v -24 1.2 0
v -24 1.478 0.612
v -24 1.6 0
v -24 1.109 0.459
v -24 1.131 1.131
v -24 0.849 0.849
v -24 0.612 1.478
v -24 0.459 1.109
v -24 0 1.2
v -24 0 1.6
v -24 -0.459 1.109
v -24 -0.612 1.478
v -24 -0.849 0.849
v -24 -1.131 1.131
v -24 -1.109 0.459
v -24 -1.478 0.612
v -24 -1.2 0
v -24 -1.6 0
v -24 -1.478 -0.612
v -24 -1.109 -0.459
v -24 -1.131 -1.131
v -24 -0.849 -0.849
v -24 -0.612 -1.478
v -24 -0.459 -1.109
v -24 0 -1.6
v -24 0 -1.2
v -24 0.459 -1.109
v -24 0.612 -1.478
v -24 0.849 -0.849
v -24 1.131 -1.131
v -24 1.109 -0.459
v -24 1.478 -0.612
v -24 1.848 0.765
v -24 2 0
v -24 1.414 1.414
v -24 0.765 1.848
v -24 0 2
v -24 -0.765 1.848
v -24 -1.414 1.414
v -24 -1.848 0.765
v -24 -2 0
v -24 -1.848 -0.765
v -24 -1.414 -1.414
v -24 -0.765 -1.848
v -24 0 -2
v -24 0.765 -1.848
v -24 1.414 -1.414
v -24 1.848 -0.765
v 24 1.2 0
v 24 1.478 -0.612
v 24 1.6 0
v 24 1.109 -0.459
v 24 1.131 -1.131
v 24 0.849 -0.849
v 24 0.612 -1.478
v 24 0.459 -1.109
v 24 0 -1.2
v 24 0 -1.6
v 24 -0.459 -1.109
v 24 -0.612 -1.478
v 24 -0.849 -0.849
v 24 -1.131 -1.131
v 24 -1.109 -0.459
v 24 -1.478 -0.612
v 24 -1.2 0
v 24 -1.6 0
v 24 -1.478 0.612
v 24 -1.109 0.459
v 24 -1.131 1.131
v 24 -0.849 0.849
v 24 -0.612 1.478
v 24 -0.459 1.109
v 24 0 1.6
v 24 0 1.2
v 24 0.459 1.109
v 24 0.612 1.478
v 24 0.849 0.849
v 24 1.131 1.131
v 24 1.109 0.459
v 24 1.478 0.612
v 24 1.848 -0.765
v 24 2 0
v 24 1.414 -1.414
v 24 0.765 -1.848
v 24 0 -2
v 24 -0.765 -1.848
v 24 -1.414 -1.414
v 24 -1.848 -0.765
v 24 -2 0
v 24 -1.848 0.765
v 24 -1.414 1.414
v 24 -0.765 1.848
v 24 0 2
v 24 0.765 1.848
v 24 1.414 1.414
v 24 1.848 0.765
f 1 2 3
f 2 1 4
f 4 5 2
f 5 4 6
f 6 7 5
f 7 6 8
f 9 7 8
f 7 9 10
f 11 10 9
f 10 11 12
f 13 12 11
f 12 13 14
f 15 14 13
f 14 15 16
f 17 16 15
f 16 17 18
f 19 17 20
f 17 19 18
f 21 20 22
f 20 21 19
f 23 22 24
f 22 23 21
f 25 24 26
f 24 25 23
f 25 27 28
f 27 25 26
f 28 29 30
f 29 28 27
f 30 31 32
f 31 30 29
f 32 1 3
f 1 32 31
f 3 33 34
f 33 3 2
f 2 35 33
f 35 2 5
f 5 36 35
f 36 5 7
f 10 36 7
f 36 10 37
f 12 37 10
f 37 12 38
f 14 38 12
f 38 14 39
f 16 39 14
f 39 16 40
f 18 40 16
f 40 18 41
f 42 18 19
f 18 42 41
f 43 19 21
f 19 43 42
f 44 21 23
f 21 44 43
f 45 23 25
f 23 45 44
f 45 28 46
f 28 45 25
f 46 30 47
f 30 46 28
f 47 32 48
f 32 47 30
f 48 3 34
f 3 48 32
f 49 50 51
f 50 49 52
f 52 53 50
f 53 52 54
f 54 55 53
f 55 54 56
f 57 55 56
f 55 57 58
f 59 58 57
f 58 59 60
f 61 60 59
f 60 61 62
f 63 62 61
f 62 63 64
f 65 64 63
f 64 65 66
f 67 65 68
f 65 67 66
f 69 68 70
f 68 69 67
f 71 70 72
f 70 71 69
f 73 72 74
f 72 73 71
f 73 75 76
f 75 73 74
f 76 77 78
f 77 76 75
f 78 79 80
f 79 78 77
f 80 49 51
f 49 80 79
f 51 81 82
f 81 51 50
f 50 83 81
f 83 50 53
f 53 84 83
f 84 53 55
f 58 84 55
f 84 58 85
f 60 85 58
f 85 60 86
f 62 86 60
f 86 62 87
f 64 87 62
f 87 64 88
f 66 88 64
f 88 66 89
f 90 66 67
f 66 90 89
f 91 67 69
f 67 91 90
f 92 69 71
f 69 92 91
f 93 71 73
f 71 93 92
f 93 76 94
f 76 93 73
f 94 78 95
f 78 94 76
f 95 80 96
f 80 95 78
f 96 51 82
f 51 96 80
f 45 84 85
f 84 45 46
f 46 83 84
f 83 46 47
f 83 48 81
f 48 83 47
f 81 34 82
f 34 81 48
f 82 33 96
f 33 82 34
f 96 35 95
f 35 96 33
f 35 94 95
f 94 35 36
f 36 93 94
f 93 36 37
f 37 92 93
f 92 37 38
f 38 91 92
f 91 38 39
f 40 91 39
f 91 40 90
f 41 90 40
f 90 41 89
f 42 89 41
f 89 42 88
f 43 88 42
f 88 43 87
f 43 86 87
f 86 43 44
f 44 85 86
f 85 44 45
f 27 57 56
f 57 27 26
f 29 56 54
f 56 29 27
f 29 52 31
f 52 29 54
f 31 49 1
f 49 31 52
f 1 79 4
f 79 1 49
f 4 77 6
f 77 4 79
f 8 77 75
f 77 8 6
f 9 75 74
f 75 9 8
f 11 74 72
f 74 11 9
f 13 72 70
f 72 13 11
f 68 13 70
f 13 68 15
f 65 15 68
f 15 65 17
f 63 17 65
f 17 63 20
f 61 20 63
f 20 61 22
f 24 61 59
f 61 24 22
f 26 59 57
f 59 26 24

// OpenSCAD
// file: ../p/4-4disc.scad
use <../lib.scad>
$fa=1; $fs=0.2;
function ldraw_lib__4_4disc(realsolid=false) = [
// 0 Disc 1.0
// 0 Name: 4-4disc.dat
// 0 Author: James Jessiman
// 0 !LDRAW_ORG Primitive UPDATE 2002-02
// 0 !LICENSE Licensed under CC BY 2.0 and CC BY 4.0 : see CAreadme.txt
// 
// 0 BFC CERTIFY CCW
  [0,"BFC","CERTIFY"],
  [0,"BFC","CCW"],
// 
// 0 !HISTORY 1998-12-15 [PTadmin] Official Update 1998-10
// 0 !HISTORY 2002-03-23 [sbliss] Added BFC statement
// 0 !HISTORY 2002-04-25 [PTadmin] Official Update 2002-02
// 0 !HISTORY 2007-06-24 [PTadmin] Header formatted for Contributor Agreement
// 0 !HISTORY 2008-07-01 [PTadmin] Official Update 2008-01
// 
// 
// 3 16 0 0 0 1 0 0 0.9239 0 0.3827
  [3,16,0,0,0,1,0,0,0.9239,0,0.3827],
// 3 16 0 0 0 0.9239 0 0.3827 0.7071 0 0.7071
  [3,16,0,0,0,0.9239,0,0.3827,0.7071,0,0.7071],
// 3 16 0 0 0 0.7071 0 0.7071 0.3827 0 0.9239
  [3,16,0,0,0,0.7071,0,0.7071,0.3827,0,0.9239],
// 3 16 0 0 0 0.3827 0 0.9239 0 0 1
  [3,16,0,0,0,0.3827,0,0.9239,0,0,1],
// 3 16 0 0 0 0 0 1 -0.3827 0 0.9239
  [3,16,0,0,0,0,0,1,-0.3827,0,0.9239],
// 3 16 0 0 0 -0.3827 0 0.9239 -0.7071 0 0.7071
  [3,16,0,0,0,-0.3827,0,0.9239,-0.7071,0,0.7071],
// 3 16 0 0 0 -0.7071 0 0.7071 -0.9239 0 0.3827
  [3,16,0,0,0,-0.7071,0,0.7071,-0.9239,0,0.3827],
// 3 16 0 0 0 -0.9239 0 0.3827 -1 0 -0
  [3,16,0,0,0,-0.9239,0,0.3827,-1,0,-0],
// 3 16 0 0 0 -1 0 -0 -0.9239 0 -0.3827
  [3,16,0,0,0,-1,0,-0,-0.9239,0,-0.3827],
// 3 16 0 0 0 -0.9239 0 -0.3827 -0.7071 0 -0.7071
  [3,16,0,0,0,-0.9239,0,-0.3827,-0.7071,0,-0.7071],
// 3 16 0 0 0 -0.7071 0 -0.7071 -0.3827 0 -0.9239
  [3,16,0,0,0,-0.7071,0,-0.7071,-0.3827,0,-0.9239],
// 3 16 0 0 0 -0.3827 0 -0.9239 0 0 -1
  [3,16,0,0,0,-0.3827,0,-0.9239,0,0,-1],
// 3 16 0 0 0 0 0 -1 0.3827 0 -0.9239
  [3,16,0,0,0,0,0,-1,0.3827,0,-0.9239],
// 3 16 0 0 0 0.3827 0 -0.9239 0.7071 0 -0.7071
  [3,16,0,0,0,0.3827,0,-0.9239,0.7071,0,-0.7071],
// 3 16 0 0 0 0.7071 0 -0.7071 0.9239 0 -0.3827
  [3,16,0,0,0,0.7071,0,-0.7071,0.9239,0,-0.3827],
// 3 16 0 0 0 0.9239 0 -0.3827 1 0 0
  [3,16,0,0,0,0.9239,0,-0.3827,1,0,0],
// 0
];
module ldraw_lib__4_4disc(step=0, col=false, unit=2/5, alt=false, line=0.2, solid=!$preview)
    makepoly(ldraw_lib__4_4disc(solid), step=step, col=col, unit=unit, alt=alt, line=line, solid=solid);
ldraw_lib__4_4disc(line=0.2);
// file: ../p/stud3.scad
use <../lib.scad>
use <4-4cyli.scad>
use <4-4disc.scad>
use <4-4edge.scad>
$fa=1; $fs=0.2;
function ldraw_lib__stud3(realsolid=false) = realsolid ? 
    [openscad(translate([0,0,-eps()], o=cylinder(4+eps(), r=4)),2)] : [
// 0 Stud Tube Solid
// 0 Name: stud3.dat
// 0 Author: James Jessiman
// 0 !LDRAW_ORG Primitive UPDATE 2012-01
// 0 !LICENSE Licensed under CC BY 2.0 and CC BY 4.0 : see CAreadme.txt
// 
// 0 BFC CERTIFY CCW
  [0,"BFC","CERTIFY"],
  [0,"BFC","CCW"],
// 
// 0 !HISTORY 2002-04-04 [sbliss] Modified for BFC compliance
// 0 !HISTORY 2002-04-25 [PTadmin] Official Update 2002-02
// 0 !HISTORY 2007-06-24 [PTadmin] Header formatted for Contributor Agreement
// 0 !HISTORY 2008-07-01 [PTadmin] Official Update 2008-01
// 0 !HISTORY 2012-02-16 [Philo] Changed to CCW
// 0 !HISTORY 2012-03-30 [PTadmin] Official Update 2012-01
// 
// 
// 1 16 0 -4 0 4 0 0 0 1 0 0 0 4 4-4edge.dat
  [1,16,0,-4,0,4,0,0,0,1,0,0,0,4, ldraw_lib__4_4edge(realsolid)],
// 1 16 0 0 0 4 0 0 0 1 0 0 0 4 4-4edge.dat
  [1,16,0,0,0,4,0,0,0,1,0,0,0,4, ldraw_lib__4_4edge(realsolid)],
// 1 16 0 -4 0 4 0 0 0 1 0 0 0 4 4-4disc.dat
  [1,16,0,-4,0,4,0,0,0,1,0,0,0,4, ldraw_lib__4_4disc(realsolid)],
// 1 16 0 -4 0 4 0 0 0 4 0 0 0 4 4-4cyli.dat
  [1,16,0,-4,0,4,0,0,0,4,0,0,0,4, ldraw_lib__4_4cyli(realsolid)],
];
module ldraw_lib__stud3(step=0, col=false, unit=2/5, alt=false, line=0.2, solid=!$preview)
    makepoly(ldraw_lib__stud3(solid), step=step, col=col, unit=unit, alt=alt, line=line, solid=solid);
ldraw_lib__stud3(line=0.2);
// file: ../p/stud.scad
use <../lib.scad>
use <4-4cyli.scad>
use <4-4disc.scad>
use <4-4edge.scad>
$fa=1; $fs=0.2;
function ldraw_lib__stud(realsolid=false) = realsolid ? 
    [openscad(translate([0,0,-eps()], o=cylinder(4+eps(), r=6)),2)] : [
// 0 Stud
// 0 Name: stud.dat
// 0 Author: James Jessiman
// 0 !LDRAW_ORG Primitive UPDATE 2012-01
// 0 !LICENSE Licensed under CC BY 2.0 and CC BY 4.0 : see CAreadme.txt
// 
// 0 BFC CERTIFY CCW
  [0,"BFC","CERTIFY"],
  [0,"BFC","CCW"],
// 
// 0 !HISTORY 2002-04-04 [sbliss] Modified for BFC compliance
// 0 !HISTORY 2002-04-25 [PTadmin] Official Update 2002-02
// 0 !HISTORY 2007-06-24 [PTadmin] Header formatted for Contributor Agreement
// 0 !HISTORY 2008-07-01 [PTadmin] Official Update 2008-01
// 0 !HISTORY 2012-02-16 [Philo] Changed to CCW
// 0 !HISTORY 2012-03-30 [PTadmin] Official Update 2012-01
// 
// 
// 1 16 0 0 0 6 0 0 0 1 0 0 0 6 4-4edge.dat
  [1,16,0,0,0,6,0,0,0,1,0,0,0,6, ldraw_lib__4_4edge(realsolid)],
// 1 16 0 -4 0 6 0 0 0 1 0 0 0 6 4-4edge.dat
  [1,16,0,-4,0,6,0,0,0,1,0,0,0,6, ldraw_lib__4_4edge(realsolid)],
// 1 16 0 0 0 6 0 0 0 -4 0 0 0 6 4-4cyli.dat
  [1,16,0,0,0,6,0,0,0,-4,0,0,0,6, ldraw_lib__4_4cyli(realsolid)],
// 1 16 0 -4 0 6 0 0 0 1 0 0 0 6 4-4disc.dat
  [1,16,0,-4,0,6,0,0,0,1,0,0,0,6, ldraw_lib__4_4disc(realsolid)],
];
module ldraw_lib__stud(step=0, col=false, unit=2/5, alt=false, line=0.2, solid=!$preview)
    makepoly(ldraw_lib__stud(solid), step=step, col=col, unit=unit, alt=alt, line=line, solid=solid);
ldraw_lib__stud(line=0.2);
// file: ../p/box5.scad
use <../lib.scad>
$fa=1; $fs=0.2;
function ldraw_lib__box5(realsolid=false) = [
// 0 Box with 5 Faces and All Edges
// 0 Name: box5.dat
// 0 Author: James Jessiman
// 0 !LDRAW_ORG Primitive UPDATE 2012-01
// 0 !LICENSE Licensed under CC BY 2.0 and CC BY 4.0 : see CAreadme.txt
// 
// 0 BFC CERTIFY CCW
  [0,"BFC","CERTIFY"],
  [0,"BFC","CCW"],
// 
// 0 !HISTORY 2002-04-03 [sbliss] Modified for BFC compliance
// 0 !HISTORY 2002-04-25 [PTadmin] Official Update 2002-02
// 0 !HISTORY 2007-06-24 [PTadmin] Header formatted for Contributor Agreement
// 0 !HISTORY 2008-07-01 [PTadmin] Official Update 2008-01
// 0 !HISTORY 2012-02-16 [Philo] Changed to CCW
// 0 !HISTORY 2012-03-30 [PTadmin] Official Update 2012-01
// 
// 
// 2 24 1 1 1 -1 1 1
  [2,24,1,1,1,-1,1,1],
// 2 24 -1 1 1 -1 1 -1
  [2,24,-1,1,1,-1,1,-1],
// 2 24 -1 1 -1 1 1 -1
  [2,24,-1,1,-1,1,1,-1],
// 2 24 1 1 -1 1 1 1
  [2,24,1,1,-1,1,1,1],
// 2 24 1 0 1 -1 0 1
  [2,24,1,0,1,-1,0,1],
// 2 24 -1 0 1 -1 0 -1
  [2,24,-1,0,1,-1,0,-1],
// 2 24 -1 0 -1 1 0 -1
  [2,24,-1,0,-1,1,0,-1],
// 2 24 1 0 -1 1 0 1
  [2,24,1,0,-1,1,0,1],
// 2 24 1 0 1 1 1 1
  [2,24,1,0,1,1,1,1],
// 2 24 -1 0 1 -1 1 1
  [2,24,-1,0,1,-1,1,1],
// 2 24 1 0 -1 1 1 -1
  [2,24,1,0,-1,1,1,-1],
// 2 24 -1 0 -1 -1 1 -1
  [2,24,-1,0,-1,-1,1,-1],
// 4 16 -1 1 1 1 1 1 1 1 -1 -1 1 -1
  [4,16,-1,1,1,1,1,1,1,1,-1,-1,1,-1],
// 4 16 -1 1 1 -1 0 1 1 0 1 1 1 1
  [4,16,-1,1,1,-1,0,1,1,0,1,1,1,1],
// 4 16 -1 1 -1 -1 0 -1 -1 0 1 -1 1 1
  [4,16,-1,1,-1,-1,0,-1,-1,0,1,-1,1,1],
// 4 16 1 1 -1 1 0 -1 -1 0 -1 -1 1 -1
  [4,16,1,1,-1,1,0,-1,-1,0,-1,-1,1,-1],
// 4 16 1 1 1 1 0 1 1 0 -1 1 1 -1
  [4,16,1,1,1,1,0,1,1,0,-1,1,1,-1],
];
module ldraw_lib__box5(step=0, col=false, unit=2/5, alt=false, line=0.2, solid=!$preview)
    makepoly(ldraw_lib__box5(solid), step=step, col=col, unit=unit, alt=alt, line=line, solid=solid);
ldraw_lib__box5(line=0.2);
// file: ../p/box4t.scad
use <../lib.scad>
$fa=1; $fs=0.2;
function ldraw_lib__box4t(realsolid=false) = [
// 0 Box with 4 Adjacent Faces and All Edges
// 0 Name: box4t.dat
// 0 Author: Tore Eriksson [Tore_Eriksson]
// 0 !LDRAW_ORG Primitive UPDATE 2003-02
// 0 !LICENSE Licensed under CC BY 2.0 and CC BY 4.0 : see CAreadme.txt
// 
// 0 BFC CERTIFY CCW
  [0,"BFC","CERTIFY"],
  [0,"BFC","CCW"],
// 
// 0 !HISTORY 1997-09-29 [PTadmin] Official Update 1997-15
// 0 !HISTORY 2002-08-31 [izanette] Modified with WINDZ for BFC compliance
// 0 !HISTORY 2003-08-01 [PTadmin] Official Update 2003-02
// 0 !HISTORY 2007-06-24 [PTadmin] Header formatted for Contributor Agreement
// 0 !HISTORY 2008-07-01 [PTadmin] Official Update 2008-01
// 
// 
// 2 24 1 1 1 -1 1 1
  [2,24,1,1,1,-1,1,1],
// 2 24 -1 1 1 -1 1 -1
  [2,24,-1,1,1,-1,1,-1],
// 2 24 -1 1 -1 1 1 -1
  [2,24,-1,1,-1,1,1,-1],
// 2 24 1 1 -1 1 1 1
  [2,24,1,1,-1,1,1,1],
// 2 24 1 0 1 -1 0 1
  [2,24,1,0,1,-1,0,1],
// 2 24 -1 0 1 -1 0 -1
  [2,24,-1,0,1,-1,0,-1],
// 2 24 -1 0 -1 1 0 -1
  [2,24,-1,0,-1,1,0,-1],
// 2 24 1 0 -1 1 0 1
  [2,24,1,0,-1,1,0,1],
// 2 24 1 0 1 1 1 1
  [2,24,1,0,1,1,1,1],
// 2 24 -1 0 1 -1 1 1
  [2,24,-1,0,1,-1,1,1],
// 2 24 1 0 -1 1 1 -1
  [2,24,1,0,-1,1,1,-1],
// 2 24 -1 0 -1 -1 1 -1
  [2,24,-1,0,-1,-1,1,-1],
// 4 16 1 1 1 1 1 -1 -1 1 -1 -1 1 1
  [4,16,1,1,1,1,1,-1,-1,1,-1,-1,1,1],
// 4 16 1 1 1 -1 1 1 -1 0 1 1 0 1
  [4,16,1,1,1,-1,1,1,-1,0,1,1,0,1],
// 4 16 -1 1 1 -1 1 -1 -1 0 -1 -1 0 1
  [4,16,-1,1,1,-1,1,-1,-1,0,-1,-1,0,1],
// 0 4 16 -1 1 -1 -1 0 -1 1 0 -1 1 1 -1
// 4 16 1 1 -1 1 1 1 1 0 1 1 0 -1
  [4,16,1,1,-1,1,1,1,1,0,1,1,0,-1],
// 0
];
module ldraw_lib__box4t(step=0, col=false, unit=2/5, alt=false, line=0.2, solid=!$preview)
    makepoly(ldraw_lib__box4t(solid), step=step, col=col, unit=unit, alt=alt, line=line, solid=solid);
ldraw_lib__box4t(line=0.2);
// file: s/3004s01.scad
use <../../lib.scad>
use <../../p/box4t.scad>
use <../../p/box5.scad>
use <../../p/stud.scad>
use <../../p/stud3.scad>
$fa=1; $fs=0.2;
function ldraw_lib__s__3004s01(realsolid=false) = [
// 0 ~Brick  1 x  2 without Front Face
// 0 Name: s\3004s01.dat
// 0 Author: James Jessiman
// 0 !LDRAW_ORG Subpart UPDATE 2003-03
// 0 !LICENSE Licensed under CC BY 2.0 and CC BY 4.0 : see CAreadme.txt
// 
// 0 BFC CERTIFY CCW
  [0,"BFC","CERTIFY"],
  [0,"BFC","CCW"],
// 
// 0 !HISTORY 2003-09-07 [jriley] Subfiling, BFC
// 0 !HISTORY 2003-12-19 [PTadmin] Official Update 2003-03
// 0 !HISTORY 2007-08-29 [PTadmin] Header formatted for Contributor Agreement
// 0 !HISTORY 2008-07-01 [PTadmin] Official Update 2008-01
// 
// 
// 1 16 0 4 0 1 0 0 0 -5 0 0 0 1 stud3.dat
  [1,16,0,4,0,1,0,0,0,-5,0,0,0,1, ldraw_lib__stud3(realsolid)],
// 0 BFC INVERTNEXT
  [0,"BFC","INVERTNEXT"],
// 1 16 0 24 0 16 0 0 0 -20 0 0 0 6 box5.dat
  [1,16,0,24,0,16,0,0,0,-20,0,0,0,6, ldraw_lib__box5(realsolid)],
// 4 16 20 24 10 16 24 6 -16 24 6 -20 24 10
  [4,16,20,24,10,16,24,6,-16,24,6,-20,24,10],
// 4 16 -20 24 10 -16 24 6 -16 24 -6 -20 24 -10
  [4,16,-20,24,10,-16,24,6,-16,24,-6,-20,24,-10],
// 4 16 -20 24 -10 -16 24 -6 16 24 -6 20 24 -10
  [4,16,-20,24,-10,-16,24,-6,16,24,-6,20,24,-10],
// 4 16 20 24 -10 16 24 -6 16 24 6 20 24 10
  [4,16,20,24,-10,16,24,-6,16,24,6,20,24,10],
// 1 16 0 24 0 20 0 0 0 -24 0 0 0 10 box4t.dat
  [1,16,0,24,0,20,0,0,0,-24,0,0,0,10, ldraw_lib__box4t(realsolid)],
// 1 16 10 0 0 1 0 0 0 1 0 0 0 1 stud.dat
  [1,16,10,0,0,1,0,0,0,1,0,0,0,1, ldraw_lib__stud(realsolid)],
// 1 16 -10 0 0 1 0 0 0 1 0 0 0 1 stud.dat
  [1,16,-10,0,0,1,0,0,0,1,0,0,0,1, ldraw_lib__stud(realsolid)],
// 0
];
module ldraw_lib__s__3004s01(step=0, col=false, unit=2/5, alt=false, line=0.2, solid=!$preview)
    makepoly(ldraw_lib__s__3004s01(solid), step=step, col=col, unit=unit, alt=alt, line=line, solid=solid);
ldraw_lib__s__3004s01(line=0.2);
// file: ../p/4-4cyli.scad
use <../lib.scad>
$fa=1; $fs=0.2;
function ldraw_lib__4_4cyli(realsolid=false) = [
// 0 Cylinder 1.0
// 0 Name: 4-4cyli.dat
// 0 Author: James Jessiman
// 0 !LDRAW_ORG Primitive UPDATE 2005-01
// 0 !LICENSE Licensed under CC BY 2.0 and CC BY 4.0 : see CAreadme.txt
// 
// 0 BFC CERTIFY CCW
  [0,"BFC","CERTIFY"],
  [0,"BFC","CCW"],
// 
// 0 !HISTORY 1998-12-15 [PTadmin] Official Update 1998-10
// 0 !HISTORY 2002-03-23 [sbliss] Added BFC statement; merged headers from files in distributions LDraw 0.27 and Complete.
// 0 !HISTORY 2002-04-25 [PTadmin] Official Update 2002-02
// 0 !HISTORY 2004-12-14 [guyvivan] BFC CCW
// 0 !HISTORY 2005-12-28 [PTadmin] Official Update 2005-01
// 0 !HISTORY 2007-06-24 [PTadmin] Header formatted for Contributor Agreement
// 0 !HISTORY 2008-07-01 [PTadmin] Official Update 2008-01
// 
// 
// 4 16 1 1 0 0.9239 1 0.3827 0.9239 0 0.3827 1 0 0
  [4,16,1,1,0,0.9239,1,0.3827,0.9239,0,0.3827,1,0,0],
// 5 24 1 0 0 1 1 0 0.9239 0 0.3827 0.9239 0 -0.3827
  [5,24,1,0,0,1,1,0,0.9239,0,0.3827,0.9239,0,-0.3827],
// 4 16 0.9239 1 0.3827 0.7071 1 0.7071 0.7071 0 0.7071 0.9239 0 0.3827
  [4,16,0.9239,1,0.3827,0.7071,1,0.7071,0.7071,0,0.7071,0.9239,0,0.3827],
// 5 24 0.9239 0 0.3827 0.9239 1 0.3827 0.7071 0 0.7071 1 0 0
  [5,24,0.9239,0,0.3827,0.9239,1,0.3827,0.7071,0,0.7071,1,0,0],
// 4 16 0.7071 1 0.7071 0.3827 1 0.9239 0.3827 0 0.9239 0.7071 0 0.7071
  [4,16,0.7071,1,0.7071,0.3827,1,0.9239,0.3827,0,0.9239,0.7071,0,0.7071],
// 5 24 0.7071 0 0.7071 0.7071 1 0.7071 0.3827 0 0.9239 0.9239 0 0.3827
  [5,24,0.7071,0,0.7071,0.7071,1,0.7071,0.3827,0,0.9239,0.9239,0,0.3827],
// 4 16 0.3827 1 0.9239 0 1 1 0 0 1 0.3827 0 0.9239
  [4,16,0.3827,1,0.9239,0,1,1,0,0,1,0.3827,0,0.9239],
// 5 24 0.3827 0 0.9239 0.3827 1 0.9239 0 0 1 0.7071 0 0.7071
  [5,24,0.3827,0,0.9239,0.3827,1,0.9239,0,0,1,0.7071,0,0.7071],
// 4 16 0 1 1 -0.3827 1 0.9239 -0.3827 0 0.9239 0 0 1
  [4,16,0,1,1,-0.3827,1,0.9239,-0.3827,0,0.9239,0,0,1],
// 5 24 0 0 1 0 1 1 -0.3827 0 0.9239 0.3827 0 0.9239
  [5,24,0,0,1,0,1,1,-0.3827,0,0.9239,0.3827,0,0.9239],
// 4 16 -0.3827 1 0.9239 -0.7071 1 0.7071 -0.7071 0 0.7071 -0.3827 0 0.9239
  [4,16,-0.3827,1,0.9239,-0.7071,1,0.7071,-0.7071,0,0.7071,-0.3827,0,0.9239],
// 5 24 -0.3827 0 0.9239 -0.3827 1 0.9239 -0.7071 0 0.7071 0 0 1
  [5,24,-0.3827,0,0.9239,-0.3827,1,0.9239,-0.7071,0,0.7071,0,0,1],
// 4 16 -0.7071 1 0.7071 -0.9239 1 0.3827 -0.9239 0 0.3827 -0.7071 0 0.7071
  [4,16,-0.7071,1,0.7071,-0.9239,1,0.3827,-0.9239,0,0.3827,-0.7071,0,0.7071],
// 5 24 -0.7071 0 0.7071 -0.7071 1 0.7071 -0.9239 0 0.3827 -0.3827 0 0.9239
  [5,24,-0.7071,0,0.7071,-0.7071,1,0.7071,-0.9239,0,0.3827,-0.3827,0,0.9239],
// 4 16 -0.9239 1 0.3827 -1 1 0 -1 0 0 -0.9239 0 0.3827
  [4,16,-0.9239,1,0.3827,-1,1,0,-1,0,0,-0.9239,0,0.3827],
// 5 24 -0.9239 0 0.3827 -0.9239 1 0.3827 -1 0 0 -0.7071 0 0.7071
  [5,24,-0.9239,0,0.3827,-0.9239,1,0.3827,-1,0,0,-0.7071,0,0.7071],
// 4 16 -1 1 0 -0.9239 1 -0.3827 -0.9239 0 -0.3827 -1 0 0
  [4,16,-1,1,0,-0.9239,1,-0.3827,-0.9239,0,-0.3827,-1,0,0],
// 5 24 -1 0 0 -1 1 0 -0.9239 0 -0.3827 -0.9239 0 0.3827
  [5,24,-1,0,0,-1,1,0,-0.9239,0,-0.3827,-0.9239,0,0.3827],
// 4 16 -0.9239 1 -0.3827 -0.7071 1 -0.7071 -0.7071 0 -0.7071 -0.9239 0 -0.3827
  [4,16,-0.9239,1,-0.3827,-0.7071,1,-0.7071,-0.7071,0,-0.7071,-0.9239,0,-0.3827],
// 5 24 -0.9239 0 -0.3827 -0.9239 1 -0.3827 -0.7071 0 -0.7071 -1 0 0
  [5,24,-0.9239,0,-0.3827,-0.9239,1,-0.3827,-0.7071,0,-0.7071,-1,0,0],
// 4 16 -0.7071 1 -0.7071 -0.3827 1 -0.9239 -0.3827 0 -0.9239 -0.7071 0 -0.7071
  [4,16,-0.7071,1,-0.7071,-0.3827,1,-0.9239,-0.3827,0,-0.9239,-0.7071,0,-0.7071],
// 5 24 -0.7071 0 -0.7071 -0.7071 1 -0.7071 -0.3827 0 -0.9239 -0.9239 0 -0.3827
  [5,24,-0.7071,0,-0.7071,-0.7071,1,-0.7071,-0.3827,0,-0.9239,-0.9239,0,-0.3827],
// 4 16 -0.3827 1 -0.9239 0 1 -1 0 0 -1 -0.3827 0 -0.9239
  [4,16,-0.3827,1,-0.9239,0,1,-1,0,0,-1,-0.3827,0,-0.9239],
// 5 24 -0.3827 0 -0.9239 -0.3827 1 -0.9239 0 0 -1 -0.7071 0 -0.7071
  [5,24,-0.3827,0,-0.9239,-0.3827,1,-0.9239,0,0,-1,-0.7071,0,-0.7071],
// 4 16 0 1 -1 0.3827 1 -0.9239 0.3827 0 -0.9239 0 0 -1
  [4,16,0,1,-1,0.3827,1,-0.9239,0.3827,0,-0.9239,0,0,-1],
// 5 24 0 0 -1 0 1 -1 0.3827 0 -0.9239 -0.3827 0 -0.9239
  [5,24,0,0,-1,0,1,-1,0.3827,0,-0.9239,-0.3827,0,-0.9239],
// 4 16 0.3827 1 -0.9239 0.7071 1 -0.7071 0.7071 0 -0.7071 0.3827 0 -0.9239
  [4,16,0.3827,1,-0.9239,0.7071,1,-0.7071,0.7071,0,-0.7071,0.3827,0,-0.9239],
// 5 24 0.3827 0 -0.9239 0.3827 1 -0.9239 0.7071 0 -0.7071 0 0 -1
  [5,24,0.3827,0,-0.9239,0.3827,1,-0.9239,0.7071,0,-0.7071,0,0,-1],
// 4 16 0.7071 1 -0.7071 0.9239 1 -0.3827 0.9239 0 -0.3827 0.7071 0 -0.7071
  [4,16,0.7071,1,-0.7071,0.9239,1,-0.3827,0.9239,0,-0.3827,0.7071,0,-0.7071],
// 5 24 0.7071 0 -0.7071 0.7071 1 -0.7071 0.9239 0 -0.3827 0.3827 0 -0.9239
  [5,24,0.7071,0,-0.7071,0.7071,1,-0.7071,0.9239,0,-0.3827,0.3827,0,-0.9239],
// 4 16 0.9239 1 -0.3827 1 1 0 1 0 0 0.9239 0 -0.3827
  [4,16,0.9239,1,-0.3827,1,1,0,1,0,0,0.9239,0,-0.3827],
// 5 24 0.9239 0 -0.3827 0.9239 1 -0.3827 1 0 0 0.7071 0 -0.7071
  [5,24,0.9239,0,-0.3827,0.9239,1,-0.3827,1,0,0,0.7071,0,-0.7071],
// 0
];
module ldraw_lib__4_4cyli(step=0, col=false, unit=2/5, alt=false, line=0.2, solid=!$preview)
    makepoly(ldraw_lib__4_4cyli(solid), step=step, col=col, unit=unit, alt=alt, line=line, solid=solid);
ldraw_lib__4_4cyli(line=0.2);
// file: ../p/4-4ring4.scad
use <../lib.scad>
$fa=1; $fs=0.2;
function ldraw_lib__4_4ring4(realsolid=false) = [
// 0 Ring  4 x 1.0
// 0 Name: 4-4ring4.dat
// 0 Author: James Jessiman
// 0 !LDRAW_ORG Primitive UPDATE 2009-01
// 0 !LICENSE Licensed under CC BY 2.0 and CC BY 4.0 : see CAreadme.txt
// 
// 0 BFC CERTIFY CCW
  [0,"BFC","CERTIFY"],
  [0,"BFC","CCW"],
// 
// 0 !HISTORY 1998-12-15 [PTadmin] Official Update 1998-10
// 0 !HISTORY 2002-04-08 [BrickCaster] Modified for BFC compliance
// 0 !HISTORY 2002-04-25 [PTadmin] Official Update 2002-02
// 0 !HISTORY 2007-06-24 [PTadmin] Header formatted for Contributor Agreement
// 0 !HISTORY 2008-07-01 [PTadmin] Official Update 2008-01
// 0 !HISTORY 2008-08-26 [cwdee] Switch polygon winding and rename
// 0 !HISTORY 2009-05-02 [PTadmin] Official Update 2009-01
// 
// 
// 4 16 -1.9135 0 4.6195 -1.5308 0 3.6956 0 0 4 0 0 5
  [4,16,-1.9135,0,4.6195,-1.5308,0,3.6956,0,0,4,0,0,5],
// 4 16 -3.5355 0 3.5355 -2.8284 0 2.8284 -1.5308 0 3.6956 -1.9135 0 4.6195
  [4,16,-3.5355,0,3.5355,-2.8284,0,2.8284,-1.5308,0,3.6956,-1.9135,0,4.6195],
// 4 16 -4.6195 0 1.9135 -3.6956 0 1.5308 -2.8284 0 2.8284 -3.5355 0 3.5355
  [4,16,-4.6195,0,1.9135,-3.6956,0,1.5308,-2.8284,0,2.8284,-3.5355,0,3.5355],
// 4 16 -5 0 0 -4 0 0 -3.6956 0 1.5308 -4.6195 0 1.9135
  [4,16,-5,0,0,-4,0,0,-3.6956,0,1.5308,-4.6195,0,1.9135],
// 4 16 -4.6195 0 -1.9135 -3.6956 0 -1.5308 -4 0 0 -5 0 0
  [4,16,-4.6195,0,-1.9135,-3.6956,0,-1.5308,-4,0,0,-5,0,0],
// 4 16 -3.5355 0 -3.5355 -2.8284 0 -2.8284 -3.6956 0 -1.5308 -4.6195 0 -1.9135
  [4,16,-3.5355,0,-3.5355,-2.8284,0,-2.8284,-3.6956,0,-1.5308,-4.6195,0,-1.9135],
// 4 16 -1.9135 0 -4.6195 -1.5308 0 -3.6956 -2.8284 0 -2.8284 -3.5355 0 -3.5355
  [4,16,-1.9135,0,-4.6195,-1.5308,0,-3.6956,-2.8284,0,-2.8284,-3.5355,0,-3.5355],
// 4 16 0 0 -5 0 0 -4 -1.5308 0 -3.6956 -1.9135 0 -4.6195
  [4,16,0,0,-5,0,0,-4,-1.5308,0,-3.6956,-1.9135,0,-4.6195],
// 4 16 1.9135 0 -4.6195 1.5308 0 -3.6956 0 0 -4 0 0 -5
  [4,16,1.9135,0,-4.6195,1.5308,0,-3.6956,0,0,-4,0,0,-5],
// 4 16 3.5355 0 -3.5355 2.8284 0 -2.8284 1.5308 0 -3.6956 1.9135 0 -4.6195
  [4,16,3.5355,0,-3.5355,2.8284,0,-2.8284,1.5308,0,-3.6956,1.9135,0,-4.6195],
// 4 16 4.6195 0 -1.9135 3.6956 0 -1.5308 2.8284 0 -2.8284 3.5355 0 -3.5355
  [4,16,4.6195,0,-1.9135,3.6956,0,-1.5308,2.8284,0,-2.8284,3.5355,0,-3.5355],
// 4 16 5 0 0 4 0 0 3.6956 0 -1.5308 4.6195 0 -1.9135
  [4,16,5,0,0,4,0,0,3.6956,0,-1.5308,4.6195,0,-1.9135],
// 4 16 4.6195 0 1.9135 3.6956 0 1.5308 4 0 0 5 0 0
  [4,16,4.6195,0,1.9135,3.6956,0,1.5308,4,0,0,5,0,0],
// 4 16 3.5355 0 3.5355 2.8284 0 2.8284 3.6956 0 1.5308 4.6195 0 1.9135
  [4,16,3.5355,0,3.5355,2.8284,0,2.8284,3.6956,0,1.5308,4.6195,0,1.9135],
// 4 16 1.9135 0 4.6195 1.5308 0 3.6956 2.8284 0 2.8284 3.5355 0 3.5355
  [4,16,1.9135,0,4.6195,1.5308,0,3.6956,2.8284,0,2.8284,3.5355,0,3.5355],
// 4 16 0 0 5 0 0 4 1.5308 0 3.6956 1.9135 0 4.6195
  [4,16,0,0,5,0,0,4,1.5308,0,3.6956,1.9135,0,4.6195],
// 0
];
module ldraw_lib__4_4ring4(step=0, col=false, unit=2/5, alt=false, line=0.2, solid=!$preview)
    makepoly(ldraw_lib__4_4ring4(solid), step=step, col=col, unit=unit, alt=alt, line=line, solid=solid);
ldraw_lib__4_4ring4(line=0.2);
// file: ../p/4-4ring3.scad
use <../lib.scad>
$fa=1; $fs=0.2;
function ldraw_lib__4_4ring3(realsolid=false) = [
// 0 Ring  3 x 1.0
// 0 Name: 4-4ring3.dat
// 0 Author: James Jessiman
// 0 !LDRAW_ORG Primitive UPDATE 2009-01
// 0 !LICENSE Licensed under CC BY 2.0 and CC BY 4.0 : see CAreadme.txt
// 
// 0 BFC CERTIFY CCW
  [0,"BFC","CERTIFY"],
  [0,"BFC","CCW"],
// 
// 0 !HISTORY 1998-12-15 [PTadmin] Official Update 1998-10
// 0 !HISTORY 2002-04-05 [hafhead] Added BFC statement
// 0 !HISTORY 2002-04-25 [PTadmin] Official Update 2002-02
// 0 !HISTORY 2007-06-24 [PTadmin] Header formatted for Contributor Agreement
// 0 !HISTORY 2008-07-01 [PTadmin] Official Update 2008-01
// 0 !HISTORY 2008-08-26 [cwdee] Switch polygon winding and rename
// 0 !HISTORY 2009-05-02 [PTadmin] Official Update 2009-01
// 
// 
// 4 16 -1.5308 0 3.6956 -1.1481 0 2.7717 0 0 3 0 0 4
  [4,16,-1.5308,0,3.6956,-1.1481,0,2.7717,0,0,3,0,0,4],
// 4 16 -2.8284 0 2.8284 -2.1213 0 2.1213 -1.1481 0 2.7717 -1.5308 0 3.6956
  [4,16,-2.8284,0,2.8284,-2.1213,0,2.1213,-1.1481,0,2.7717,-1.5308,0,3.6956],
// 4 16 -3.6956 0 1.5308 -2.7717 0 1.1481 -2.1213 0 2.1213 -2.8284 0 2.8284
  [4,16,-3.6956,0,1.5308,-2.7717,0,1.1481,-2.1213,0,2.1213,-2.8284,0,2.8284],
// 4 16 -4 0 0 -3 0 0 -2.7717 0 1.1481 -3.6956 0 1.5308
  [4,16,-4,0,0,-3,0,0,-2.7717,0,1.1481,-3.6956,0,1.5308],
// 4 16 -3.6956 0 -1.5308 -2.7717 0 -1.1481 -3 0 0 -4 0 0
  [4,16,-3.6956,0,-1.5308,-2.7717,0,-1.1481,-3,0,0,-4,0,0],
// 4 16 -2.8284 0 -2.8284 -2.1213 0 -2.1213 -2.7717 0 -1.1481 -3.6956 0 -1.5308
  [4,16,-2.8284,0,-2.8284,-2.1213,0,-2.1213,-2.7717,0,-1.1481,-3.6956,0,-1.5308],
// 4 16 -1.5308 0 -3.6956 -1.1481 0 -2.7717 -2.1213 0 -2.1213 -2.8284 0 -2.8284
  [4,16,-1.5308,0,-3.6956,-1.1481,0,-2.7717,-2.1213,0,-2.1213,-2.8284,0,-2.8284],
// 4 16 0 0 -4 0 0 -3 -1.1481 0 -2.7717 -1.5308 0 -3.6956
  [4,16,0,0,-4,0,0,-3,-1.1481,0,-2.7717,-1.5308,0,-3.6956],
// 4 16 1.5308 0 -3.6956 1.1481 0 -2.7717 0 0 -3 0 0 -4
  [4,16,1.5308,0,-3.6956,1.1481,0,-2.7717,0,0,-3,0,0,-4],
// 4 16 2.8284 0 -2.8284 2.1213 0 -2.1213 1.1481 0 -2.7717 1.5308 0 -3.6956
  [4,16,2.8284,0,-2.8284,2.1213,0,-2.1213,1.1481,0,-2.7717,1.5308,0,-3.6956],
// 4 16 3.6956 0 -1.5308 2.7717 0 -1.1481 2.1213 0 -2.1213 2.8284 0 -2.8284
  [4,16,3.6956,0,-1.5308,2.7717,0,-1.1481,2.1213,0,-2.1213,2.8284,0,-2.8284],
// 4 16 4 0 0 3 0 0 2.7717 0 -1.1481 3.6956 0 -1.5308
  [4,16,4,0,0,3,0,0,2.7717,0,-1.1481,3.6956,0,-1.5308],
// 4 16 3.6956 0 1.5308 2.7717 0 1.1481 3 0 0 4 0 0
  [4,16,3.6956,0,1.5308,2.7717,0,1.1481,3,0,0,4,0,0],
// 4 16 2.8284 0 2.8284 2.1213 0 2.1213 2.7717 0 1.1481 3.6956 0 1.5308
  [4,16,2.8284,0,2.8284,2.1213,0,2.1213,2.7717,0,1.1481,3.6956,0,1.5308],
// 4 16 1.5308 0 3.6956 1.1481 0 2.7717 2.1213 0 2.1213 2.8284 0 2.8284
  [4,16,1.5308,0,3.6956,1.1481,0,2.7717,2.1213,0,2.1213,2.8284,0,2.8284],
// 4 16 0 0 4 0 0 3 1.1481 0 2.7717 1.5308 0 3.6956
  [4,16,0,0,4,0,0,3,1.1481,0,2.7717,1.5308,0,3.6956],
// 0
];
module ldraw_lib__4_4ring3(step=0, col=false, unit=2/5, alt=false, line=0.2, solid=!$preview)
    makepoly(ldraw_lib__4_4ring3(solid), step=step, col=col, unit=unit, alt=alt, line=line, solid=solid);
ldraw_lib__4_4ring3(line=0.2);
// file: ../p/4-4edge.scad
use <../lib.scad>
$fa=1; $fs=0.2;
function ldraw_lib__4_4edge(realsolid=false) = [
// 0 Circle 1.0
// 0 Name: 4-4edge.dat
// 0 Author: James Jessiman
// 0 !LDRAW_ORG Primitive UPDATE 2017-01
// 0 !LICENSE Licensed under CC BY 2.0 and CC BY 4.0 : see CAreadme.txt
// 
// 0 BFC CERTIFY CCW
  [0,"BFC","CERTIFY"],
  [0,"BFC","CCW"],
// 
// 0 !HISTORY 1998-12-15 [PTadmin] Official Update 1998-10
// 0 !HISTORY 2005-12-28 [PTadmin] Official Update 2005-01
// 0 !HISTORY 2007-06-24 [PTadmin] Header formatted for Contributor Agreement
// 0 !HISTORY 2008-07-01 [PTadmin] Official Update 2008-01
// 0 !HISTORY 2017-01-15 [Steffen] BFCed
// 0 !HISTORY 2017-12-30 [PTadmin] Official Update 2017-01
// 
// 
// 2 24 1 0 0 0.9239 0 0.3827
  [2,24,1,0,0,0.9239,0,0.3827],
// 2 24 0.9239 0 0.3827 0.7071 0 0.7071
  [2,24,0.9239,0,0.3827,0.7071,0,0.7071],
// 2 24 0.7071 0 0.7071 0.3827 0 0.9239
  [2,24,0.7071,0,0.7071,0.3827,0,0.9239],
// 2 24 0.3827 0 0.9239 0 0 1
  [2,24,0.3827,0,0.9239,0,0,1],
// 2 24 0 0 1 -0.3827 0 0.9239
  [2,24,0,0,1,-0.3827,0,0.9239],
// 2 24 -0.3827 0 0.9239 -0.7071 0 0.7071
  [2,24,-0.3827,0,0.9239,-0.7071,0,0.7071],
// 2 24 -0.7071 0 0.7071 -0.9239 0 0.3827
  [2,24,-0.7071,0,0.7071,-0.9239,0,0.3827],
// 2 24 -0.9239 0 0.3827 -1 0 -0
  [2,24,-0.9239,0,0.3827,-1,0,-0],
// 2 24 -1 0 -0 -0.9239 0 -0.3827
  [2,24,-1,0,-0,-0.9239,0,-0.3827],
// 2 24 -0.9239 0 -0.3827 -0.7071 0 -0.7071
  [2,24,-0.9239,0,-0.3827,-0.7071,0,-0.7071],
// 2 24 -0.7071 0 -0.7071 -0.3827 0 -0.9239
  [2,24,-0.7071,0,-0.7071,-0.3827,0,-0.9239],
// 2 24 -0.3827 0 -0.9239 0 0 -1
  [2,24,-0.3827,0,-0.9239,0,0,-1],
// 2 24 0 0 -1 0.3827 0 -0.9239
  [2,24,0,0,-1,0.3827,0,-0.9239],
// 2 24 0.3827 0 -0.9239 0.7071 0 -0.7071
  [2,24,0.3827,0,-0.9239,0.7071,0,-0.7071],
// 2 24 0.7071 0 -0.7071 0.9239 0 -0.3827
  [2,24,0.7071,0,-0.7071,0.9239,0,-0.3827],
// 2 24 0.9239 0 -0.3827 1 0 0
  [2,24,0.9239,0,-0.3827,1,0,0],
];
module ldraw_lib__4_4edge(step=0, col=false, unit=2/5, alt=false, line=0.2, solid=!$preview)
    makepoly(ldraw_lib__4_4edge(solid), step=step, col=col, unit=unit, alt=alt, line=line, solid=solid);
ldraw_lib__4_4edge(line=0.2);
// file: 3004.scad
use <../lib.scad>
use <s/3004s01.scad>
$fa=1; $fs=0.2;
function ldraw_lib__3004(realsolid=false) = [
// 0 Brick  1 x  2
// 0 Name: 3004.dat
// 0 Author: James Jessiman
// 0 !LDRAW_ORG Part UPDATE 2022-05
// 0 !LICENSE Licensed under CC BY 2.0 and CC BY 4.0 : see CAreadme.txt
// 
// 0 BFC CERTIFY CCW
  [0,"BFC","CERTIFY"],
  [0,"BFC","CCW"],
// 
// 0 !HISTORY 2001-10-26 [PTadmin] Official Update 2001-01
// 0 !HISTORY 2002-05-07 {unknown} BFC Certification
// 0 !HISTORY 2002-06-11 [PTadmin] Official Update 2002-03
// 0 !HISTORY 2007-05-07 [PTadmin] Header formatted for Contributor Agreement
// 0 !HISTORY 2008-07-01 [PTadmin] Official Update 2008-01
// 0 !HISTORY 2022-08-04 [MagFors] Using subfile
// 0 !HISTORY 2022-09-15 [PTadmin] Official Update 2022-05
// 
// 
// 1 16 0 0 0 1 0 0 0 1 0 0 0 1 s\3004s01.dat
  [1,16,0,0,0,1,0,0,0,1,0,0,0,1, ldraw_lib__s__3004s01(realsolid)],
// 4 16 -20 24 -10 20 24 -10 20 0 -10 -20 0 -10
  [4,16,-20,24,-10,20,24,-10,20,0,-10,-20,0,-10],
];
module ldraw_lib__3004(step=0, col=false, unit=2/5, alt=false, line=0.2, solid=!$preview)
    makepoly(ldraw_lib__3004(solid), step=step, col=col, unit=unit, alt=alt, line=line, solid=solid);
ldraw_lib__3004(line=0.2);
// file: 71533k03.scad
use <../lib.scad>
use <../p/4-4cyli.scad>
$fa=1; $fs=0.2;
function ldraw_lib__71533k03(realsolid=false) = [
// 0 ~Technic Pneumatic Tube Segment
// 0 Name: 71533k03.dat
// 0 Author: Jaco van der Molen [Jaco]
// 0 !LDRAW_ORG Part Flexible_Section UPDATE 2020-01
// 0 !LICENSE Licensed under CC BY 2.0 and CC BY 4.0 : see CAreadme.txt
// 
// 0 BFC CERTIFY CW
  [0,"BFC","CERTIFY"],
  [0,"BFC","CW"],
// 
// 0 !HISTORY 2003-11-30 [Steffen] BFCed
// 0 !HISTORY 2009-12-29 [PTadmin] Official Update 2009-03
// 0 !HISTORY 2020-06-27 [PTadmin] Renamed from 166
// 0 !HISTORY 2020-06-28 [PTadmin] Official Update 2020-01
// 
// 
// 1 16 0 0 0 5 0 0 0 1 0 0 0 5 4-4cyli.dat
  [1,16,0,0,0,5,0,0,0,1,0,0,0,5, ldraw_lib__4_4cyli(realsolid)],
// 0 BFC INVERTNEXT
  [0,"BFC","INVERTNEXT"],
// 1 16 0 0 0 3 0 0 0 1 0 0 0 3 4-4cyli.dat
  [1,16,0,0,0,3,0,0,0,1,0,0,0,3, ldraw_lib__4_4cyli(realsolid)],
// 0
];
module ldraw_lib__71533k03(step=0, col=false, unit=2/5, alt=false, line=0.2, solid=!$preview)
    makepoly(ldraw_lib__71533k03(solid), step=step, col=col, unit=unit, alt=alt, line=line, solid=solid);
ldraw_lib__71533k03(line=0.2);
// file: 71533k02.scad
use <../lib.scad>
use <../p/4-4edge.scad>
use <../p/4-4ring3.scad>
use <../p/4-4ring4.scad>
$fa=1; $fs=0.2;
function ldraw_lib__71533k02(realsolid=false) = [
// 0 ~Technic Pneumatic Tube End (Non-Bulged)
// 0 Name: 71533k02.dat
// 0 Author: Steffen [Steffen]
// 0 !LDRAW_ORG Part Flexible_Section UPDATE 2020-01
// 0 !LICENSE Licensed under CC BY 2.0 and CC BY 4.0 : see CAreadme.txt
// 
// 0 BFC CERTIFY CCW
  [0,"BFC","CERTIFY"],
  [0,"BFC","CCW"],
// 
// 0 !HISTORY 2020-06-28 [PTadmin] Official Update 2020-01
// 
// 
// 0 // This file goes together with 71533k01.dat and 71533k03.dat.
// 0 // Those 3 files can be used to create Technic Pneumatic Tubes
// 0 // with either bulged or non-bulged ends.
// 
// 1 16 0 0 0 1 0 0 0 1 0 0 0 1 4-4ring3.dat
  [1,16,0,0,0,1,0,0,0,1,0,0,0,1, ldraw_lib__4_4ring3(realsolid)],
// 1 16 0 0 0 1 0 0 0 1 0 0 0 1 4-4ring4.dat
  [1,16,0,0,0,1,0,0,0,1,0,0,0,1, ldraw_lib__4_4ring4(realsolid)],
// 1 16 0 0 0 3 0 0 0 3 0 0 0 3 4-4edge.dat
  [1,16,0,0,0,3,0,0,0,3,0,0,0,3, ldraw_lib__4_4edge(realsolid)],
// 1 16 0 0 0 5 0 0 0 5 0 0 0 5 4-4edge.dat
  [1,16,0,0,0,5,0,0,0,5,0,0,0,5, ldraw_lib__4_4edge(realsolid)],
];
module ldraw_lib__71533k02(step=0, col=false, unit=2/5, alt=false, line=0.2, solid=!$preview)
    makepoly(ldraw_lib__71533k02(solid), step=step, col=col, unit=unit, alt=alt, line=line, solid=solid);
ldraw_lib__71533k02(line=0.2);
// main file
use <../lib.scad>
use <71533k02.scad>
use <71533k03.scad>
$fa=1; $fs=0.2;
function ldraw_lib__21766_f1(realsolid=false) = [
// 0 Technic Pneumatic Tube  6L
// 0 Name: 21766-f1.dat
// 0 Author: Philippe Hurbain [Philo]
// 0 !LDRAW_ORG Part UPDATE 2020-01
// 0 !LICENSE Licensed under CC BY 2.0 and CC BY 4.0 : see CAreadme.txt
// 
// 0 BFC CERTIFY CCW
  [0,"BFC","CERTIFY"],
  [0,"BFC","CCW"],
// 
// 0 !KEYWORDS 48 mm
// 
// 0 !HISTORY 2020-06-28 [PTadmin] Official Update 2020-01
// 
// 
// 1 16 -60 0 0 0 1 0 1 0 0 0 0 1 71533k02.dat
  [1,16,-60,0,0,0,1,0,1,0,0,0,0,1, ldraw_lib__71533k02(realsolid)],
// 1 16 60 0 0 0 -1 0 -1 0 0 0 0 1 71533k02.dat
  [1,16,60,0,0,0,-1,0,-1,0,0,0,0,1, ldraw_lib__71533k02(realsolid)],
// 1 16 -60 0 0 0 120 0 1 0 0 0 0 1 71533k03.dat
  [1,16,-60,0,0,0,120,0,1,0,0,0,0,1, ldraw_lib__71533k03(realsolid)],
];
module ldraw_lib__21766_f1(step=0, col=false, unit=2/5, alt=false, line=0.2, solid=!$preview)
    makepoly(ldraw_lib__21766_f1(solid), step=step, col=col, unit=unit, alt=alt, line=line, solid=solid);
ldraw_lib__21766_f1(line=0.2);
